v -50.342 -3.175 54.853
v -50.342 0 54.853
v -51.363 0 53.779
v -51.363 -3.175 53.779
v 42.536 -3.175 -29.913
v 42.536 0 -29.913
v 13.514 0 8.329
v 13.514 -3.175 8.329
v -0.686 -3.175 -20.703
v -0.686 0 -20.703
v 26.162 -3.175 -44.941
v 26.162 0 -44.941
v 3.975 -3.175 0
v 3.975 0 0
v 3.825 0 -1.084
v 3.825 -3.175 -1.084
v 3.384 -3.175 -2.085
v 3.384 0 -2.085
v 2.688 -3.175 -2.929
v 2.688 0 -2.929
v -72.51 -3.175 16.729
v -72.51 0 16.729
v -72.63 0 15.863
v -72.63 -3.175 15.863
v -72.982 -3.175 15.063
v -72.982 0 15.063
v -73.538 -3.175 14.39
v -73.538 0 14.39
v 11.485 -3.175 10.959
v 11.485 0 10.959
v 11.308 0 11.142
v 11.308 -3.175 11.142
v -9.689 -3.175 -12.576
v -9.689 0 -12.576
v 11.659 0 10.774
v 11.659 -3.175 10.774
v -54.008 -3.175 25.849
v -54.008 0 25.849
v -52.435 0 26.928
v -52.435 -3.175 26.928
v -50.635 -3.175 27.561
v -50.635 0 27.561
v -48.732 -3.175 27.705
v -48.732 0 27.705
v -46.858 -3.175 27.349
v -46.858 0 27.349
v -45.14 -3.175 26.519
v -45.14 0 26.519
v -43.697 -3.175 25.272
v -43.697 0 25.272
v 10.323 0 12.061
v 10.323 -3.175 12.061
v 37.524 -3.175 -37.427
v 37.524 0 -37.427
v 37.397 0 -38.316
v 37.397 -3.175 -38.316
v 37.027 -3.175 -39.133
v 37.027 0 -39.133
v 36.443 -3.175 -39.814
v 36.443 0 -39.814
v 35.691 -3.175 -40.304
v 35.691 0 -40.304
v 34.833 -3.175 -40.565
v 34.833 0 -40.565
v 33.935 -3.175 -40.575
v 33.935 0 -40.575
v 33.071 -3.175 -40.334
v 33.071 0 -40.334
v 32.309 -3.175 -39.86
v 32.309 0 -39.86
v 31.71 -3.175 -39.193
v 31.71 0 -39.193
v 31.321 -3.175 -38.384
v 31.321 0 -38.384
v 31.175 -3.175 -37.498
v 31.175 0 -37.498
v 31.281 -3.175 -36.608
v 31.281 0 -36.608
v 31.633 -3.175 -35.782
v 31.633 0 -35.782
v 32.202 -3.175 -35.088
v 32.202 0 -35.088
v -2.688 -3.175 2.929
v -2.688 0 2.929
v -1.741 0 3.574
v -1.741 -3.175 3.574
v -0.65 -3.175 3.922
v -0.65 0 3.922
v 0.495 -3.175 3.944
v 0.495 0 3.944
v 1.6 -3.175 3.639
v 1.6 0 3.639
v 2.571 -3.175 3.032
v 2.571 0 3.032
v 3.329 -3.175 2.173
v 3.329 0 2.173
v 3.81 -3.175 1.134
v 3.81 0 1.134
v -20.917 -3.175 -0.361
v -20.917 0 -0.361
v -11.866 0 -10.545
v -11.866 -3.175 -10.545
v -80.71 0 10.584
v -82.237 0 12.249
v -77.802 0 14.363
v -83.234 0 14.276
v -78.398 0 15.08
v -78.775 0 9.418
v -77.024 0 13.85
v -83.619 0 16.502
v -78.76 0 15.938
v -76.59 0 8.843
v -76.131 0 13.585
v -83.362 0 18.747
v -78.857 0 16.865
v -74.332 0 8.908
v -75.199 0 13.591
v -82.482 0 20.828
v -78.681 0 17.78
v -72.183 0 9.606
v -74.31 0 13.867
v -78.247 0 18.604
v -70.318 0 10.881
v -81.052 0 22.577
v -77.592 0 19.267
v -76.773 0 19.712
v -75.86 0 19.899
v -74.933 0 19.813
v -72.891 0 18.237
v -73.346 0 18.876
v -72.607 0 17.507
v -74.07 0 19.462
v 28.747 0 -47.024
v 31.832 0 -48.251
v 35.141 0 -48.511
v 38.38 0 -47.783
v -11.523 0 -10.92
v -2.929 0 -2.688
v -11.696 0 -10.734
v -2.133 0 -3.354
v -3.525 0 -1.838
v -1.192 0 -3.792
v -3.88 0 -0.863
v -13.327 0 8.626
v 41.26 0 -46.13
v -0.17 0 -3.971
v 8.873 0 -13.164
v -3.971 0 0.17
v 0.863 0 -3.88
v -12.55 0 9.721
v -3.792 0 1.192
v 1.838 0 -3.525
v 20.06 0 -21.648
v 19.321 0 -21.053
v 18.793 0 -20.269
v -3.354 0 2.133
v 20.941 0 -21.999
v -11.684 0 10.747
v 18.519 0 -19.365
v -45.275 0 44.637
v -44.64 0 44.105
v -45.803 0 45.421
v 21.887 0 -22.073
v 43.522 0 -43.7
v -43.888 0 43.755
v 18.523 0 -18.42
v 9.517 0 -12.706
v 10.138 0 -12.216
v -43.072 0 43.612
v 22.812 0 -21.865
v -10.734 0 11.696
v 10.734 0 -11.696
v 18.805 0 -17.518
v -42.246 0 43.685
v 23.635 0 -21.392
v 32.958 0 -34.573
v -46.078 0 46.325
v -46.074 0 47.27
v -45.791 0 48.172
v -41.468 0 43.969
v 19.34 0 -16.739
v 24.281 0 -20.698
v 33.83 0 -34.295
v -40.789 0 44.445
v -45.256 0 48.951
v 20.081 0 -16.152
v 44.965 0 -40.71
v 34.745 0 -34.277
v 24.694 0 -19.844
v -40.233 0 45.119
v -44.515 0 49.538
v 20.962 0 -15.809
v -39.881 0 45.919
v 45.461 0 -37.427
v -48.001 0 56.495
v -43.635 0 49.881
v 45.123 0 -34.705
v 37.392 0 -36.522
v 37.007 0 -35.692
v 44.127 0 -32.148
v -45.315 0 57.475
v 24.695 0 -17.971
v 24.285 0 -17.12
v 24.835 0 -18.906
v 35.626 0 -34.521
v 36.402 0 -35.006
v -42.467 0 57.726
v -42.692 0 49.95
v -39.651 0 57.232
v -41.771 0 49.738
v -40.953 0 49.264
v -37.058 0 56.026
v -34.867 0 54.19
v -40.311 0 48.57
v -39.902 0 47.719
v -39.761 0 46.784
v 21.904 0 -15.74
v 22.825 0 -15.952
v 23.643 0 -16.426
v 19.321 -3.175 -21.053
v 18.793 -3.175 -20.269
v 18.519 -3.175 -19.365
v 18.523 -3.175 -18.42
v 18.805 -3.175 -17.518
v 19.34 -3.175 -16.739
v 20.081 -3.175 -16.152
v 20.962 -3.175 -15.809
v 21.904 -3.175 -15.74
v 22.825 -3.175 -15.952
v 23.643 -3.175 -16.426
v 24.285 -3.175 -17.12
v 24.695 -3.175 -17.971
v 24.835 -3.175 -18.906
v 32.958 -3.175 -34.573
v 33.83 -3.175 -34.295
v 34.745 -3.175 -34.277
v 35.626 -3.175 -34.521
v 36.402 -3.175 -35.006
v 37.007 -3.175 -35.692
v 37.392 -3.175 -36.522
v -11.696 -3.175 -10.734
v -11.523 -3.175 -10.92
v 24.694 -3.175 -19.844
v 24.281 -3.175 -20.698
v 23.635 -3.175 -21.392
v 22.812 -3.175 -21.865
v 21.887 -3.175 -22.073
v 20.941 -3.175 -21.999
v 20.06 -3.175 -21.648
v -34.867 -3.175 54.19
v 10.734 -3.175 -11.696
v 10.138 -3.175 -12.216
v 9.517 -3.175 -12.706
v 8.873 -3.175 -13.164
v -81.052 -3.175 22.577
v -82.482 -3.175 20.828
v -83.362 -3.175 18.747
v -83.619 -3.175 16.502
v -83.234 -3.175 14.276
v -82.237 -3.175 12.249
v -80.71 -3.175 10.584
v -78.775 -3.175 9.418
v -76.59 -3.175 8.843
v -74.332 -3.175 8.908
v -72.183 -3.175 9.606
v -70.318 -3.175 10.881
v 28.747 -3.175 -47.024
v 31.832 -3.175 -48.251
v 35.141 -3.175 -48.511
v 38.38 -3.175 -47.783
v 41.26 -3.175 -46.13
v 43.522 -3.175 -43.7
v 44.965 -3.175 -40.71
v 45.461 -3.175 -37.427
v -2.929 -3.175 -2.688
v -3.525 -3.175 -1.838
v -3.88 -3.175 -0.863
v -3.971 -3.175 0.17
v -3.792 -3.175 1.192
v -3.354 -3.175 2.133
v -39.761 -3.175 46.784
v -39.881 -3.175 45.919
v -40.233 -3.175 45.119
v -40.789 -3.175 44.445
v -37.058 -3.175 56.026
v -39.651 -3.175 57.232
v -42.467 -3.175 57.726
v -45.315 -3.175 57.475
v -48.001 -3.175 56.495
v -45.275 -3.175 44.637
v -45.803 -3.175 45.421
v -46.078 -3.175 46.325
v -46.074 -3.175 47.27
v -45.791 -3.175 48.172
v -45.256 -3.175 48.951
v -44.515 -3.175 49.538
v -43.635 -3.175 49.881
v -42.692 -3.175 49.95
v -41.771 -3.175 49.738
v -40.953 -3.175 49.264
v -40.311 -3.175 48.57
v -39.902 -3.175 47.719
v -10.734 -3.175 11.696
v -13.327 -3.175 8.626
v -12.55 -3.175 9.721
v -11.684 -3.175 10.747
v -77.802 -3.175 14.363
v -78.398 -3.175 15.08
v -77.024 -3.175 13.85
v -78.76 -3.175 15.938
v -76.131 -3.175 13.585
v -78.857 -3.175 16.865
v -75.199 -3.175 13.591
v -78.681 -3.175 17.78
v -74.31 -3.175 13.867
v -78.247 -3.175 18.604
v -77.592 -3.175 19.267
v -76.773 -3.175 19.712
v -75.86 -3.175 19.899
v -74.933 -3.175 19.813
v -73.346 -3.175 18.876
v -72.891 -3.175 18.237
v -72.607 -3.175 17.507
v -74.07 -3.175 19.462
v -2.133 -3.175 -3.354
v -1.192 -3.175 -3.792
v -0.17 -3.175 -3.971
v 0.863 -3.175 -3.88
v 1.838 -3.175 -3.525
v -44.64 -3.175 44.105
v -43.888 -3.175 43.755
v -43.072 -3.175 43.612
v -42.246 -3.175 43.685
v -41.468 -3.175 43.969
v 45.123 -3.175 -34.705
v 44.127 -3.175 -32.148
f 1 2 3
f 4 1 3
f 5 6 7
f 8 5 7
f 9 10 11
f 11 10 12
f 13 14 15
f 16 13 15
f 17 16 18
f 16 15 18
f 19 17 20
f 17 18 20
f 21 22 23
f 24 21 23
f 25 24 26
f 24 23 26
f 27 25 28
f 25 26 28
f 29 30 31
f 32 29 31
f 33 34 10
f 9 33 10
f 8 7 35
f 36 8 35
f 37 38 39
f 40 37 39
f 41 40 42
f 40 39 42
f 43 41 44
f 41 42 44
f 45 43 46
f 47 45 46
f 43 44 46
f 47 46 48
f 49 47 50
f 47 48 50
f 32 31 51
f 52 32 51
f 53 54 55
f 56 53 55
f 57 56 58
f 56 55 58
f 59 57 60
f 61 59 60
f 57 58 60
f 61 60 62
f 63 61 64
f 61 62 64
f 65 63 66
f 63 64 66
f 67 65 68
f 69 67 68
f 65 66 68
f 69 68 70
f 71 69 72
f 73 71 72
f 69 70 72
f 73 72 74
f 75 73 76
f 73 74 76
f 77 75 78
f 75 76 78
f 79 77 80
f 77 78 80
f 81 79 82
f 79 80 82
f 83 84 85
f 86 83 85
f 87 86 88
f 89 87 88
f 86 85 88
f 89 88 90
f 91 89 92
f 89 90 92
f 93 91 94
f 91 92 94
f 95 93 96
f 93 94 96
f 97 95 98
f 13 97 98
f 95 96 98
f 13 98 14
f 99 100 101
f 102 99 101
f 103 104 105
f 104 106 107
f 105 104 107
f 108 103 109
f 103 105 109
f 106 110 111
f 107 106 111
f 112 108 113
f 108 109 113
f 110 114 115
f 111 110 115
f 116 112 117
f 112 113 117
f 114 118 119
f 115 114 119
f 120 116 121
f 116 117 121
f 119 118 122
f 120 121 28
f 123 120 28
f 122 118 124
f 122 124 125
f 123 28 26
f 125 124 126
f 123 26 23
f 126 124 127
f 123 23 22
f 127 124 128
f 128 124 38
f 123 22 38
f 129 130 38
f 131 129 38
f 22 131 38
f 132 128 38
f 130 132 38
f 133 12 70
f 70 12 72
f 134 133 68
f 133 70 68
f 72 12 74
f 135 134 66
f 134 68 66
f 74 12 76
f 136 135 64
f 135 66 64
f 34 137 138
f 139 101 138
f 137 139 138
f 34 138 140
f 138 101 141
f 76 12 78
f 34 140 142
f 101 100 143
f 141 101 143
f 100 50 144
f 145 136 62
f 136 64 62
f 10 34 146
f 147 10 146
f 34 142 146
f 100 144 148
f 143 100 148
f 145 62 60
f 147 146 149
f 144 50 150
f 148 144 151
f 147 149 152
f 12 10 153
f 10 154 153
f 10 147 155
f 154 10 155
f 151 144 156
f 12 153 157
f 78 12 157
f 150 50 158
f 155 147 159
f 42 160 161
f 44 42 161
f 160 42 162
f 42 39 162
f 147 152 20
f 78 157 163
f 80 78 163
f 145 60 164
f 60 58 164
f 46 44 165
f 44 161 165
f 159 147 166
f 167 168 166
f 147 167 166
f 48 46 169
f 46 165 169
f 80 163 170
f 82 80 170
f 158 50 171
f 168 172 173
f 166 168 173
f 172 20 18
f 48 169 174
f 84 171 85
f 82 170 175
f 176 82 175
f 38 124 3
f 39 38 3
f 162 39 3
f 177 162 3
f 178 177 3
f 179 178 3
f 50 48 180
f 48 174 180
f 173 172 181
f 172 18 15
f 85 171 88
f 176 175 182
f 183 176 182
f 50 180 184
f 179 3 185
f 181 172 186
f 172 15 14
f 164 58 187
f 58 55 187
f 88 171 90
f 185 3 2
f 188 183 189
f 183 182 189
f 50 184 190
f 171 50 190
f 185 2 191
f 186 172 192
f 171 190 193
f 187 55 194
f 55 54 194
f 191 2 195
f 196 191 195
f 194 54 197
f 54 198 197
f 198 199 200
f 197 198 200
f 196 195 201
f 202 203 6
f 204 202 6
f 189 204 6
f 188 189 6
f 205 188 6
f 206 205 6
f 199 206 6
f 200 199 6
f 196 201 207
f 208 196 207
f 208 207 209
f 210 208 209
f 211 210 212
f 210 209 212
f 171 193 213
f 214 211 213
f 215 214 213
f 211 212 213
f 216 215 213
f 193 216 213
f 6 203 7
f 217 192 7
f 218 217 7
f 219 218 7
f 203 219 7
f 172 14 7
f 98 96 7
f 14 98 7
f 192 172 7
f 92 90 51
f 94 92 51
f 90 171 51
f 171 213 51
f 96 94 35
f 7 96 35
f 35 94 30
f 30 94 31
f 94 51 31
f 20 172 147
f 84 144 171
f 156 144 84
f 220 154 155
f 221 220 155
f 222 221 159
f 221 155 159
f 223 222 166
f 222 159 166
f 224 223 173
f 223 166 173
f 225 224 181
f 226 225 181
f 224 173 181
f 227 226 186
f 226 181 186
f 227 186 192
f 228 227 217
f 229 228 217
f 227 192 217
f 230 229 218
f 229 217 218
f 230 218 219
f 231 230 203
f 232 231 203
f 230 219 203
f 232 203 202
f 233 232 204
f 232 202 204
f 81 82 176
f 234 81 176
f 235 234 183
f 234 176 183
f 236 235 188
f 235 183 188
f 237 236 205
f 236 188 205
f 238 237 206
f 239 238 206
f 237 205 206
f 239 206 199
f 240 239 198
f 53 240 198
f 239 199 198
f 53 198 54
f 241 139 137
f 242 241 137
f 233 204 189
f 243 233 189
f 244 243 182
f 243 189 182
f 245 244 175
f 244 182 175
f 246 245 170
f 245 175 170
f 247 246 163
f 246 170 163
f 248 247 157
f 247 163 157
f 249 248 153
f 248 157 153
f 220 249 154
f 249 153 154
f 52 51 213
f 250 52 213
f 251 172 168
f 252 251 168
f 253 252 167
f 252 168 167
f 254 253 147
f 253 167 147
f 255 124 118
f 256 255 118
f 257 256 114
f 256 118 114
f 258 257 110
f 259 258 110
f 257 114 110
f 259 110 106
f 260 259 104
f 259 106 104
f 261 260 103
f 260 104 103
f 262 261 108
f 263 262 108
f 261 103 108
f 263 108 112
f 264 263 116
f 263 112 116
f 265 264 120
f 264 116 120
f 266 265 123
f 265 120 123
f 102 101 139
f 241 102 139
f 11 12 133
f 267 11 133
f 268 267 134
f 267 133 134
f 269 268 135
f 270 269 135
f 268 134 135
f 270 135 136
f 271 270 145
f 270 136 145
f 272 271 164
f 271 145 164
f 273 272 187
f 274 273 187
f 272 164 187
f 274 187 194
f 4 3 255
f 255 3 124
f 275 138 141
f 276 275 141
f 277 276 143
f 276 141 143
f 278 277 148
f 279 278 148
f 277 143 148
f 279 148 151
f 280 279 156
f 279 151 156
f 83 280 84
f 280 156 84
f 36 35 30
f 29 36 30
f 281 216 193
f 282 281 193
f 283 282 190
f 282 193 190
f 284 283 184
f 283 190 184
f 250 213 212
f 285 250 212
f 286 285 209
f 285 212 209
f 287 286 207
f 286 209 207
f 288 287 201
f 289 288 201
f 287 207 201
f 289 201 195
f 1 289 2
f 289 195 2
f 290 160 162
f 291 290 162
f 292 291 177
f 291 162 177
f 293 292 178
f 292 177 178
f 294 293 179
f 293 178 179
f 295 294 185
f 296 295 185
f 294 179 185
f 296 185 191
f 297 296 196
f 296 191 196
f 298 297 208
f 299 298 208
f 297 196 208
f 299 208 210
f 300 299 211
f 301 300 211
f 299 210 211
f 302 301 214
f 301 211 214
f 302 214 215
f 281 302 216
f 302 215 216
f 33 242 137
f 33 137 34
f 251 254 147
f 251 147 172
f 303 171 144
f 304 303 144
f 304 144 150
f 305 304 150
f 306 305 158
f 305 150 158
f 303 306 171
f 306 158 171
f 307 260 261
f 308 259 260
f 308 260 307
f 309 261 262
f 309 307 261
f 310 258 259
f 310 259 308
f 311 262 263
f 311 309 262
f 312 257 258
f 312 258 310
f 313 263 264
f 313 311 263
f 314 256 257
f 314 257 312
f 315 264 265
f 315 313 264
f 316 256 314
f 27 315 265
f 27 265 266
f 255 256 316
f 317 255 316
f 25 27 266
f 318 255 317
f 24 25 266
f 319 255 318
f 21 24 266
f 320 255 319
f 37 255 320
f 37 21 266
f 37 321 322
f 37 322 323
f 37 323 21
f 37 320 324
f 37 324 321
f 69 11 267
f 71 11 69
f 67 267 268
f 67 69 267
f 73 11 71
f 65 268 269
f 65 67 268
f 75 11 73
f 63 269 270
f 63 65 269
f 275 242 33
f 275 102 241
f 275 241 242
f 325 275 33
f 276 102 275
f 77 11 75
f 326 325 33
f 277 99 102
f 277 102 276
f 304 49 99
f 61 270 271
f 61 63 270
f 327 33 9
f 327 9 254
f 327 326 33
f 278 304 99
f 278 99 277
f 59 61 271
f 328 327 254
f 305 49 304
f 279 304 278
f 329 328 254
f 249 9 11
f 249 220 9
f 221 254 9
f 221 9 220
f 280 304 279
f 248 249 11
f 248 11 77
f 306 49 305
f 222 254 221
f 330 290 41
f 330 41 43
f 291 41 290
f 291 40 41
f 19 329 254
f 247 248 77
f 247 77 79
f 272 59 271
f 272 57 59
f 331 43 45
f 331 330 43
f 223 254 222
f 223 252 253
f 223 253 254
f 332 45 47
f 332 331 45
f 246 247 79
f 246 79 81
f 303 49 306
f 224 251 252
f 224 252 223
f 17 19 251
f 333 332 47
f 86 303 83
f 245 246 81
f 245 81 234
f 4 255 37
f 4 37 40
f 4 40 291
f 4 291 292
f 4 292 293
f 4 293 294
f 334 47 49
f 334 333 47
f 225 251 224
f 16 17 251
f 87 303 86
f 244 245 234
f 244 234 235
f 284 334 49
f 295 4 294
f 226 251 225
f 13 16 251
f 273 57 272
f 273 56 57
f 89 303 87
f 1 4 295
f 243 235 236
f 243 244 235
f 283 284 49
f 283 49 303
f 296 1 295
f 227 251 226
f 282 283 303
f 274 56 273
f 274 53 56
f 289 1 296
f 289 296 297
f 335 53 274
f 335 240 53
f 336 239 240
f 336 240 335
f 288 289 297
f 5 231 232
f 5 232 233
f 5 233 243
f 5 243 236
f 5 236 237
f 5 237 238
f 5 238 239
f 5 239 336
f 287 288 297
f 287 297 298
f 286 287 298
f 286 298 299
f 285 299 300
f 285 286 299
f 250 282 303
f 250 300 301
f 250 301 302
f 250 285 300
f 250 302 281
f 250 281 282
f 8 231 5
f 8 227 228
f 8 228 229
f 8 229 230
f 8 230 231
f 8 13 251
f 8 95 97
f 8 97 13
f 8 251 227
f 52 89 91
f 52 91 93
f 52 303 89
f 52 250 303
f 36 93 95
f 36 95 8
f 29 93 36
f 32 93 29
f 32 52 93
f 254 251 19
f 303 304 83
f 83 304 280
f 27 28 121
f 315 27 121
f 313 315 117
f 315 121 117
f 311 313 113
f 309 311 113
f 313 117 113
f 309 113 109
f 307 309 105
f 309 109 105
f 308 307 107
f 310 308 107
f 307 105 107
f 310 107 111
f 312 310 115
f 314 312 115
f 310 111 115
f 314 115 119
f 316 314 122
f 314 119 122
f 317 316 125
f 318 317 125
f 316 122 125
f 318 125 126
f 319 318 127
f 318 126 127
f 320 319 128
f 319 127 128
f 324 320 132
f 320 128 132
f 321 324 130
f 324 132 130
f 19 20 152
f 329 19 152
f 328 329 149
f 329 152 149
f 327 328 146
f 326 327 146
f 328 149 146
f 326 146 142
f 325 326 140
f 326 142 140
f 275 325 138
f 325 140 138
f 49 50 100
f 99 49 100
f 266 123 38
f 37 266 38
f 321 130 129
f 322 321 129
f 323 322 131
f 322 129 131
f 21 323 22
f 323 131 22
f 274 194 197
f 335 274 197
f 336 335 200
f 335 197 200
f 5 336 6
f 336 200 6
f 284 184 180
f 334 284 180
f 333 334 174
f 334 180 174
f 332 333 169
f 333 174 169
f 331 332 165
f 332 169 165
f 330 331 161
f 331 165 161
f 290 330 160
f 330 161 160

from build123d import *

# Parameters (mm, degrees)
F1_DEPTH = 3.175


with BuildPart() as f1:
    # F0 (on Front) → F1 (new body)
    with BuildSketch(Plane.XZ):
        with BuildLine():
            ThreePointArc((-2.6877932952, 2.9286835289), (1.5995582019, 3.6390704265), (3.9751, 0))
            ThreePointArc((3.9751, 0), (3.6390704265, -1.5995582019), (2.6877932952, -2.9286835289))
            Line((2.6877932952, -2.9286835289), (10.7339987827, -11.6960204828))
            ThreePointArc((10.7339987827, -11.6960204828), (14.5330288597, -6.3880119883), (15.875, 0))
            ThreePointArc((15.875, 0), (15.2734304328, 4.3287351287), (13.5143136611, 8.3294028158))
            Line((13.5143136611, 8.3294028158), (11.6590601378, 10.7741329908))
            Line((11.6590601378, 10.7741329908), (11.4851871667, 10.9592928944))
            Line((11.4851871667, 10.9592928944), (11.3083739877, 11.1416472191))
            Line((11.3083739877, 11.1416472191), (10.3225973322, 12.0606637179))
            ThreePointArc((10.3225973322, 12.0606637179), (-0.2748708071, 15.8726201693), (-10.7339987827, 11.6960204828))
            Line((-10.7339987827, 11.6960204828), (-2.6877932952, 2.9286835289))
        make_face()
        with BuildLine():
            ThreePointArc((-2.9286835289, -2.6877932952), (-3.9714488487, 0.1703351178), (-2.6877932952, 2.9286835289))
            Line((-2.6877932952, 2.9286835289), (-10.7339987827, 11.6960204828))
            Line((-10.7339987827, 11.6960204828), (-13.3268527784, 8.6261590538))
            ThreePointArc((-13.3268527784, 8.6261590538), (-15.8291292061, -1.2059409505), (-11.8662618768, -10.5454944915))
            Line((-11.8662618768, -10.5454944915), (-11.6960204828, -10.7339987827))
            Line((-11.6960204828, -10.7339987827), (-2.9286835289, -2.6877932952))
        make_face()
        with BuildLine():
            Line((10.7339987827, -11.6960204828), (2.6877932952, -2.9286835289))
            ThreePointArc((2.6877932952, -2.9286835289), (-0.1703351178, -3.9714488487), (-2.9286835289, -2.6877932952))
            Line((-2.9286835289, -2.6877932952), (-11.6960204828, -10.7339987827))
            Line((-11.6960204828, -10.7339987827), (-11.5227849075, -10.9197551701))
            Line((-11.5227849075, -10.9197551701), (-9.6887004006, -12.5755600093))
            ThreePointArc((-9.6887004006, -12.5755600093), (-0.5030588817, -15.8670273448), (8.8726348179, -13.1640410357))
            Line((8.8726348179, -13.1640410357), (10.7339987827, -11.6960204828))
        make_face()
        with BuildLine():
            Line((-35.5304524208, 38.714826384), (-10.7339987827, 11.6960204828))
            ThreePointArc((-10.7339987827, 11.6960204828), (-0.2748708071, 15.8726201693), (10.3225973322, 12.0606637179))
            Line((10.3225973322, 12.0606637179), (-34.8667395835, 54.189624641))
            ThreePointArc((-34.8667395835, 54.189624641), (-32.7298053677, 50.7575739011), (-31.9836005106, 46.7840819312))
            ThreePointArc((-31.9836005106, 46.7840819312), (-32.9094460222, 42.3768990566), (-35.5304524208, 38.714826384))
        make_face()
        with BuildLine():
            ThreePointArc((-13.3268527784, 8.6261590538), (-12.1279494046, 10.2434597788), (-10.7339987827, 11.6960204828))
            Line((-10.7339987827, 11.6960204828), (-35.5304524208, 38.714826384))
            ThreePointArc((-35.5304524208, 38.714826384), (-43.4053109787, 35.8417471462), (-51.0052506778, 39.3785392213))
            Line((-51.0052506778, 39.3785392213), (-69.8368422411, 22.0958847311))
            ThreePointArc((-69.8368422411, 22.0958847311), (-68.2881475559, 19.6085836711), (-67.7473524824, 16.7288853397))
            ThreePointArc((-67.7473524824, 16.7288853397), (-68.4183380526, 13.5348793456), (-70.3178530911, 10.8808750983))
            Line((-70.3178530911, 10.8808750983), (-54.0081981098, 25.8490274689))
            ThreePointArc((-54.0081981098, 25.8490274689), (-48.7323738618, 27.7047005709), (-43.6967288942, 25.2715700939))
            Line((-43.6967288942, 25.2715700939), (-20.9173687453, -0.3607843802))
            Line((-20.9173687453, -0.3607843802), (-13.3268527784, 8.6261590538))
        make_face()
        with BuildLine():
            Line((19.3211978133, -21.0528368739), (10.7339987827, -11.6960204828))
            ThreePointArc((10.7339987827, -11.6960204828), (9.830757416, -12.4648238507), (8.8726348179, -13.1640410357))
            Line((8.8726348179, -13.1640410357), (-0.6862483149, -20.7029410933))
            Line((-0.6862483149, -20.7029410933), (26.1615817665, -44.9410646928))
            ThreePointArc((26.1615817665, -44.9410646928), (23.2465029972, -36.9510890975), (26.8349969566, -29.240051207))
            Line((26.8349969566, -29.240051207), (19.3211978133, -21.0528368739))
        make_face()
        with BuildLine():
            ThreePointArc((15.875, 0), (14.5330288597, -6.3880119883), (10.7339987827, -11.6960204828))
            Line((10.7339987827, -11.6960204828), (19.3211978133, -21.0528368739))
            Line((19.3211978133, -21.0528368739), (26.8349969566, -29.240051207))
            ThreePointArc((26.8349969566, -29.240051207), (34.824972552, -26.3249724376), (42.5360104425, -29.9134663971))
            Line((42.5360104425, -29.9134663971), (13.5143136611, 8.3294028158))
            ThreePointArc((13.5143136611, 8.3294028158), (15.2734304328, 4.3287351287), (15.875, 0))
        make_face()
        with BuildLine():
            ThreePointArc((24.8354019053, -18.9060371125), (22.812281241, -21.8647190819), (19.3211978133, -21.0528368739))
            ThreePointArc((19.3211978133, -21.0528368739), (20.5085225697, -15.9473551431), (24.8354019053, -18.9060371125))
        make_face(mode=Mode.SUBTRACT)
        with BuildLine():
            ThreePointArc((-11.8662618768, -10.5454944915), (-15.8291292061, -1.2059409505), (-13.3268527784, 8.6261590538))
            Line((-13.3268527784, 8.6261590538), (-20.9173687453, -0.3607843802))
            Line((-20.9173687453, -0.3607843802), (-11.8662618768, -10.5454944915))
        make_face()
        with BuildLine():
            ThreePointArc((-51.0052506778, 39.3785392213), (-43.4053109787, 35.8417471462), (-35.5304524208, 38.714826384))
            Line((-35.5304524208, 38.714826384), (-40.7891953741, 44.4448778346))
            ThreePointArc((-40.7891953741, 44.4448778346), (-43.0720455442, 43.6119981862), (-45.2751992272, 44.6372821746))
            Line((-45.2751992272, 44.6372821746), (-51.0052506778, 39.3785392213))
        make_face()
        with BuildLine():
            Line((-40.7891953741, 44.4448778346), (-35.5304524208, 38.714826384))
            ThreePointArc((-35.5304524208, 38.714826384), (-32.9094460222, 42.3768990566), (-31.9836005106, 46.7840819312))
            ThreePointArc((-31.9836005106, 46.7840819312), (-32.7298053677, 50.7575739011), (-34.8667395835, 54.189624641))
            ThreePointArc((-34.8667395835, 54.189624641), (-42.4666792826, 57.7264167162), (-50.3415378405, 54.8533374783))
            Line((-50.3415378405, 54.8533374783), (-51.3633206037, 53.7794470598))
            ThreePointArc((-51.3633206037, 53.7794470598), (-53.8850057244, 46.5118413574), (-51.0052506778, 39.3785392213))
            Line((-51.0052506778, 39.3785392213), (-45.2751992272, 44.6372821746))
            ThreePointArc((-45.2751992272, 44.6372821746), (-44.0878744632, 49.7427639018), (-39.7609951306, 46.7840819312))
            ThreePointArc((-39.7609951306, 46.7840819312), (-40.0293893587, 45.5064795335), (-40.7891953741, 44.4448778346))
        make_face()
        with BuildLine():
            Line((-0.6862483149, -20.7029410933), (8.8726348179, -13.1640410357))
            ThreePointArc((8.8726348179, -13.1640410357), (-0.5030588817, -15.8670273448), (-9.6887004006, -12.5755600093))
            Line((-9.6887004006, -12.5755600093), (-0.6862483149, -20.7029410933))
        make_face()
        with BuildLine():
            Line((-69.8368422411, 22.0958847311), (-51.0052506778, 39.3785392213))
            ThreePointArc((-51.0052506778, 39.3785392213), (-53.8850057244, 46.5118413574), (-51.3633206037, 53.7794470598))
            Line((-51.3633206037, 53.7794470598), (-81.0518518738, 22.5768955811))
            ThreePointArc((-81.0518518738, 22.5768955811), (-75.3447264485, 24.6590947021), (-69.8368422411, 22.0958847311))
        make_face()
        with BuildLine():
            ThreePointArc((42.5360104425, -29.9134663971), (34.824972552, -26.3249724376), (26.8349969566, -29.240051207))
            ThreePointArc((26.8349969566, -29.240051207), (23.2465029972, -36.9510890975), (26.1615817665, -44.9410646928))
            ThreePointArc((26.1615817665, -44.9410646928), (38.3803737684, -47.7826524421), (45.4612961045, -37.4272655449))
            ThreePointArc((45.4612961045, -37.4272655449), (44.7041830017, -33.3956878811), (42.5360104425, -29.9134663971))
        make_face()
        with BuildLine():
            ThreePointArc((37.5237961045, -37.4272655449), (33.0711937068, -40.3338713169), (32.201996348, -35.0880614484))
            ThreePointArc((32.201996348, -35.0880614484), (35.6263985022, -34.520659773), (37.5237961045, -37.4272655449))
        make_face(mode=Mode.SUBTRACT)
        with BuildLine():
            ThreePointArc((-67.7473524824, 16.7288853397), (-68.2881475559, 19.6085836711), (-69.8368422411, 22.0958847311))
            Line((-69.8368422411, 22.0958847311), (-73.3456483859, 18.8756850963))
            ThreePointArc((-73.3456483859, 18.8756850963), (-72.7261705118, 17.8807646723), (-72.5098524824, 16.7288853397))
            ThreePointArc((-72.5098524824, 16.7288853397), (-72.7782467105, 15.4512829421), (-73.5380527259, 14.3896812432))
            Line((-73.5380527259, 14.3896812432), (-70.3178530911, 10.8808750983))
            ThreePointArc((-70.3178530911, 10.8808750983), (-68.4183380526, 13.5348793456), (-67.7473524824, 16.7288853397))
        make_face()
        with BuildLine():
            Line((-73.3456483859, 18.8756850963), (-69.8368422411, 22.0958847311))
            ThreePointArc((-69.8368422411, 22.0958847311), (-75.3447264485, 24.6590947021), (-81.0518518738, 22.5768955811))
            ThreePointArc((-81.0518518738, 22.5768955811), (-81.5328627238, 11.3618859484), (-70.3178530911, 10.8808750983))
            Line((-70.3178530911, 10.8808750983), (-73.5380527259, 14.3896812432))
            ThreePointArc((-73.5380527259, 14.3896812432), (-78.8569362274, 16.8649357533), (-73.3456483859, 18.8756850963))
        make_face()
    extrude(amount=F1_DEPTH)


solid = f1.part
